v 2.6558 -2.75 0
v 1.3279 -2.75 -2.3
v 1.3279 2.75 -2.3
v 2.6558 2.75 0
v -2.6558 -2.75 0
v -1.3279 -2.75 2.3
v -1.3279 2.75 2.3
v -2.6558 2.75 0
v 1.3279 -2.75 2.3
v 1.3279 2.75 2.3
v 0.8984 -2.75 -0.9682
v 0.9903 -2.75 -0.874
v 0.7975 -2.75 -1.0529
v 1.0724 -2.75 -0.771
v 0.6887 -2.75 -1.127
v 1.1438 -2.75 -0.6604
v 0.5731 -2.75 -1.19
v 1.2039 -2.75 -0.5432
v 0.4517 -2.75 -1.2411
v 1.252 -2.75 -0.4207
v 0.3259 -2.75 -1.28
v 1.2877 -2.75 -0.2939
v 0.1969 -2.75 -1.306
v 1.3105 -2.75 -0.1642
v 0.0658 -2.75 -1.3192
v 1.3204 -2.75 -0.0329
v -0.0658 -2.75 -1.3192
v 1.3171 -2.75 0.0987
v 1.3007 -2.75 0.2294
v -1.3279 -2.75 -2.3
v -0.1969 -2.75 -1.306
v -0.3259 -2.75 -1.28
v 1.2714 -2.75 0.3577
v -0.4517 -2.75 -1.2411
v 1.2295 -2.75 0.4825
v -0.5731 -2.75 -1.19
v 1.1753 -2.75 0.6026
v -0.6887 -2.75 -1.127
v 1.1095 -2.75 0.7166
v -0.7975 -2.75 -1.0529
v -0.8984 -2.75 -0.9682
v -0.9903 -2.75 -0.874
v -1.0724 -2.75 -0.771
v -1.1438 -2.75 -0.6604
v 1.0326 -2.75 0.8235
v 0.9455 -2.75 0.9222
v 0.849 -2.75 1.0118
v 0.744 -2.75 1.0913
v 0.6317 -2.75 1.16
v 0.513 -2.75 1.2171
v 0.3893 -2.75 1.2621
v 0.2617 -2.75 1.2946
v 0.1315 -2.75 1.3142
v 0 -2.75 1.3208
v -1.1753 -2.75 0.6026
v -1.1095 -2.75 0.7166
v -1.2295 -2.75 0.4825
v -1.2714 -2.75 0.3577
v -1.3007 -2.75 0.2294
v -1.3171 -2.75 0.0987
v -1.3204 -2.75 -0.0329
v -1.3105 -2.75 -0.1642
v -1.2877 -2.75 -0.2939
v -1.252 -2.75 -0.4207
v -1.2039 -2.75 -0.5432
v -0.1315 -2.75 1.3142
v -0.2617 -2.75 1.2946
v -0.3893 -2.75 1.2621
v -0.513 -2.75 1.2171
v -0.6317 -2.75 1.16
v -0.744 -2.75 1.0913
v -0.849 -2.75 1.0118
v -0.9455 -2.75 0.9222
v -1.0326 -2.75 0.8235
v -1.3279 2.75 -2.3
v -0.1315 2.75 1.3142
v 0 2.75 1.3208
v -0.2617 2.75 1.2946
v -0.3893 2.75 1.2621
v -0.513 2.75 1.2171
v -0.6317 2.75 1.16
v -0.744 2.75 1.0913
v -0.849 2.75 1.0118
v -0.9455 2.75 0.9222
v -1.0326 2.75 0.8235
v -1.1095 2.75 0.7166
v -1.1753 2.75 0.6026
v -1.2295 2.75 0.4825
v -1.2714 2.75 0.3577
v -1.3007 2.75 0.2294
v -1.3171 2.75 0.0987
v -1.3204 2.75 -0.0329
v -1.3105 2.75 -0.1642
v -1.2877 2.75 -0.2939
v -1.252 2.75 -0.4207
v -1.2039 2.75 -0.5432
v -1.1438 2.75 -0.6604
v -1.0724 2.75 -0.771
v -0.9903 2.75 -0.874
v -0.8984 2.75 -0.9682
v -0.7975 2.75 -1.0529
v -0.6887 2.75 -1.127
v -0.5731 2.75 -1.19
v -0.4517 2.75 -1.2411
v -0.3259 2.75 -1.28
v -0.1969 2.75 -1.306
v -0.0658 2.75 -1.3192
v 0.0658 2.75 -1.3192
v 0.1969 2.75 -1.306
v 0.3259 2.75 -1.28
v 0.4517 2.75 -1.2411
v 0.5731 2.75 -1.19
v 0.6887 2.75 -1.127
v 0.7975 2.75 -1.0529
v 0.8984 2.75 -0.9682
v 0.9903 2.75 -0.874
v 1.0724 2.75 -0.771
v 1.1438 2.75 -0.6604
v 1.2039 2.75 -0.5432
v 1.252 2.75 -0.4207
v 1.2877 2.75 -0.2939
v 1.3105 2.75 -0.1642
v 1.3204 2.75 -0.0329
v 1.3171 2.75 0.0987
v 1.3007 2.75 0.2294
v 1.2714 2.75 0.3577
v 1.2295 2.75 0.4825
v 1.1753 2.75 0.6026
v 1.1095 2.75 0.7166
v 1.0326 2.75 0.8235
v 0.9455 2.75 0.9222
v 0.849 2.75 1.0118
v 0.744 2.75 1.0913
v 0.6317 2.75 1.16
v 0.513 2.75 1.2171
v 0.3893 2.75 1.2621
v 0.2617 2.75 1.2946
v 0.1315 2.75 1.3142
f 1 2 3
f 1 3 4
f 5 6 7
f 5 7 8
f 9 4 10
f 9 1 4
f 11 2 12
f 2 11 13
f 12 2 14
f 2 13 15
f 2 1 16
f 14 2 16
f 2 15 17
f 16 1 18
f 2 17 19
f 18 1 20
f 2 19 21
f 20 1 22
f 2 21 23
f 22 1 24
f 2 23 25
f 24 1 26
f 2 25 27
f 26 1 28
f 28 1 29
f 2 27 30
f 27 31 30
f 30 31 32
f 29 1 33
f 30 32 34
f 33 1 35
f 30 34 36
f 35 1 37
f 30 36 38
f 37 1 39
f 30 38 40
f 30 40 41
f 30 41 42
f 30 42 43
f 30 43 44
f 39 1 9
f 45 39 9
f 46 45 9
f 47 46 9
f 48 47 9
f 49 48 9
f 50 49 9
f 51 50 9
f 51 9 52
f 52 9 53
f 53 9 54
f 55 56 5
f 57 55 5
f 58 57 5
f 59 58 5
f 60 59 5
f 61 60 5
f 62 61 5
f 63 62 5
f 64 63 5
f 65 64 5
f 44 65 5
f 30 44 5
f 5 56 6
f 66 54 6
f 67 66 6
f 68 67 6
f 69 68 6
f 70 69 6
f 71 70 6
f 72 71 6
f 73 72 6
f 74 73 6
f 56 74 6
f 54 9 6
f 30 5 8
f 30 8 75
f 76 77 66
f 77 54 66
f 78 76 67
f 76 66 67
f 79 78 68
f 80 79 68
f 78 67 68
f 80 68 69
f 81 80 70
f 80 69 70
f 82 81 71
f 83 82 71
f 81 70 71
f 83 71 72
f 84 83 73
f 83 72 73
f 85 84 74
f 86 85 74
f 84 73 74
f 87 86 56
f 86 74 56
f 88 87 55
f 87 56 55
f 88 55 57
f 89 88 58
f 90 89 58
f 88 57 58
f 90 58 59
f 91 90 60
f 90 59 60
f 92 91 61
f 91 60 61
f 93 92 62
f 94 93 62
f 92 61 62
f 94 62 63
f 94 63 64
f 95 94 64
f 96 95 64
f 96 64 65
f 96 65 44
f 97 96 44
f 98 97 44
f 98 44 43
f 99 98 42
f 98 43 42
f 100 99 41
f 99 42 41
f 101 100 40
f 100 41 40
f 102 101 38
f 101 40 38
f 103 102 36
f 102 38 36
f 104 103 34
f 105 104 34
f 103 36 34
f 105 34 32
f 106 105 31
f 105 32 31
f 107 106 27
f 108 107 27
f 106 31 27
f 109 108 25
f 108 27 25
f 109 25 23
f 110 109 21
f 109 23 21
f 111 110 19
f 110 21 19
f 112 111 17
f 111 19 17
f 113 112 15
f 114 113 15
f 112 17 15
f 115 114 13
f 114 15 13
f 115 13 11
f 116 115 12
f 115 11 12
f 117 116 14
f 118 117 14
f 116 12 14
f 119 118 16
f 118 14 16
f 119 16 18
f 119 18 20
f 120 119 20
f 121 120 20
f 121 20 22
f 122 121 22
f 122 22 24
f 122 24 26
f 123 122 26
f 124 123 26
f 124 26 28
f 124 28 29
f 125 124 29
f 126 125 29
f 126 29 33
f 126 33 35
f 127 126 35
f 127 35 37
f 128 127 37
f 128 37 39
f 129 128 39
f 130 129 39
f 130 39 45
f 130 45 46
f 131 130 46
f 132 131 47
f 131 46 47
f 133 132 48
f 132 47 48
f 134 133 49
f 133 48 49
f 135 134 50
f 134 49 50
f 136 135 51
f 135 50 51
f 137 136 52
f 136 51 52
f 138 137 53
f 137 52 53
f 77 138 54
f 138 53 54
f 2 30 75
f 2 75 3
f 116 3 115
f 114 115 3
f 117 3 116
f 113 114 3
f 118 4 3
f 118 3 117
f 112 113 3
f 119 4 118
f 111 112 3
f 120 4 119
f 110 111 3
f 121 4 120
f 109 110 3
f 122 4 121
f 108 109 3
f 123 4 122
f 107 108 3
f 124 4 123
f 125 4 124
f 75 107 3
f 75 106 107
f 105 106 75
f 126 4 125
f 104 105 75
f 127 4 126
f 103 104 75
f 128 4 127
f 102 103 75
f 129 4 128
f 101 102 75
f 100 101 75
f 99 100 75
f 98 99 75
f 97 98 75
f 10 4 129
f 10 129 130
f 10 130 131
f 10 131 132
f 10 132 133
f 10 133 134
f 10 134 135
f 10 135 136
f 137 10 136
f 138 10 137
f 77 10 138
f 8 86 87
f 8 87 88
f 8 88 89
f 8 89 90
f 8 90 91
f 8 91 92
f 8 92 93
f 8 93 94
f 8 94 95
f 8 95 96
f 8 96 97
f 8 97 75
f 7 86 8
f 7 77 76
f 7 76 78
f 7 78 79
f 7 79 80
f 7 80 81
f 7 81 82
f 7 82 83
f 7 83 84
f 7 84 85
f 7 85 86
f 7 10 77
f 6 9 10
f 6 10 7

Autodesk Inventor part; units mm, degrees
ref_plane "YZ Plane" through (0, 0, 0) normal (1, 0, 0) x (0, 1, 0)
ref_plane "XZ Plane" through (0, 0, 0) normal (0, 1, 0) x (-1, 0, 0)
ref_plane "XY Plane" through (0, 0, 0) normal (0, 0, 1) x (1, 0, 0)
sketch "Skizze1" plane through (0, 0, 0) normal (0, 1, 0) x (-1, 0, 0)
  line L0 (2.6558, 0) -> (1.3279, -2.3)
  line L1 (1.3279, -2.3) -> (-1.3279, -2.3)
  line L2 (-1.3279, -2.3) -> (-2.6558, 0)
  line L3 (-2.6558, 0) -> (-1.3279, 2.3)
  line L4 (-1.3279, 2.3) -> (1.3279, 2.3)
  line L5 (1.3279, 2.3) -> (2.6558, 0)
  line L6 (0, -3.22) -> (0, 3.22) projected
  line L7 (-3.7181, 0) -> (3.7181, 0) projected
  point P0 (0, 0)
  point P1 (0, 0)
  dimension "d0" = 4.6
extrude "Extrusion1" add sketch "Skizze1" along normal mid plane 5.5
sketch "Skizze2" plane through (0, 2.75, 0) normal (0, 1, 0) x (1, 0, 0)
  point P0 (0, 0)
  point P1 (0, 0)
hole "Bohrung1" at (0, 2.75, 0) direction (0, -1, 0) diameter 2.6416 end through all thread size "6-32 UNC" class "2B" standard "ANSI Unified Screw Threads"
properties part number "22_Hexnut_5mm" material "Messing, weicher Gelbton"
